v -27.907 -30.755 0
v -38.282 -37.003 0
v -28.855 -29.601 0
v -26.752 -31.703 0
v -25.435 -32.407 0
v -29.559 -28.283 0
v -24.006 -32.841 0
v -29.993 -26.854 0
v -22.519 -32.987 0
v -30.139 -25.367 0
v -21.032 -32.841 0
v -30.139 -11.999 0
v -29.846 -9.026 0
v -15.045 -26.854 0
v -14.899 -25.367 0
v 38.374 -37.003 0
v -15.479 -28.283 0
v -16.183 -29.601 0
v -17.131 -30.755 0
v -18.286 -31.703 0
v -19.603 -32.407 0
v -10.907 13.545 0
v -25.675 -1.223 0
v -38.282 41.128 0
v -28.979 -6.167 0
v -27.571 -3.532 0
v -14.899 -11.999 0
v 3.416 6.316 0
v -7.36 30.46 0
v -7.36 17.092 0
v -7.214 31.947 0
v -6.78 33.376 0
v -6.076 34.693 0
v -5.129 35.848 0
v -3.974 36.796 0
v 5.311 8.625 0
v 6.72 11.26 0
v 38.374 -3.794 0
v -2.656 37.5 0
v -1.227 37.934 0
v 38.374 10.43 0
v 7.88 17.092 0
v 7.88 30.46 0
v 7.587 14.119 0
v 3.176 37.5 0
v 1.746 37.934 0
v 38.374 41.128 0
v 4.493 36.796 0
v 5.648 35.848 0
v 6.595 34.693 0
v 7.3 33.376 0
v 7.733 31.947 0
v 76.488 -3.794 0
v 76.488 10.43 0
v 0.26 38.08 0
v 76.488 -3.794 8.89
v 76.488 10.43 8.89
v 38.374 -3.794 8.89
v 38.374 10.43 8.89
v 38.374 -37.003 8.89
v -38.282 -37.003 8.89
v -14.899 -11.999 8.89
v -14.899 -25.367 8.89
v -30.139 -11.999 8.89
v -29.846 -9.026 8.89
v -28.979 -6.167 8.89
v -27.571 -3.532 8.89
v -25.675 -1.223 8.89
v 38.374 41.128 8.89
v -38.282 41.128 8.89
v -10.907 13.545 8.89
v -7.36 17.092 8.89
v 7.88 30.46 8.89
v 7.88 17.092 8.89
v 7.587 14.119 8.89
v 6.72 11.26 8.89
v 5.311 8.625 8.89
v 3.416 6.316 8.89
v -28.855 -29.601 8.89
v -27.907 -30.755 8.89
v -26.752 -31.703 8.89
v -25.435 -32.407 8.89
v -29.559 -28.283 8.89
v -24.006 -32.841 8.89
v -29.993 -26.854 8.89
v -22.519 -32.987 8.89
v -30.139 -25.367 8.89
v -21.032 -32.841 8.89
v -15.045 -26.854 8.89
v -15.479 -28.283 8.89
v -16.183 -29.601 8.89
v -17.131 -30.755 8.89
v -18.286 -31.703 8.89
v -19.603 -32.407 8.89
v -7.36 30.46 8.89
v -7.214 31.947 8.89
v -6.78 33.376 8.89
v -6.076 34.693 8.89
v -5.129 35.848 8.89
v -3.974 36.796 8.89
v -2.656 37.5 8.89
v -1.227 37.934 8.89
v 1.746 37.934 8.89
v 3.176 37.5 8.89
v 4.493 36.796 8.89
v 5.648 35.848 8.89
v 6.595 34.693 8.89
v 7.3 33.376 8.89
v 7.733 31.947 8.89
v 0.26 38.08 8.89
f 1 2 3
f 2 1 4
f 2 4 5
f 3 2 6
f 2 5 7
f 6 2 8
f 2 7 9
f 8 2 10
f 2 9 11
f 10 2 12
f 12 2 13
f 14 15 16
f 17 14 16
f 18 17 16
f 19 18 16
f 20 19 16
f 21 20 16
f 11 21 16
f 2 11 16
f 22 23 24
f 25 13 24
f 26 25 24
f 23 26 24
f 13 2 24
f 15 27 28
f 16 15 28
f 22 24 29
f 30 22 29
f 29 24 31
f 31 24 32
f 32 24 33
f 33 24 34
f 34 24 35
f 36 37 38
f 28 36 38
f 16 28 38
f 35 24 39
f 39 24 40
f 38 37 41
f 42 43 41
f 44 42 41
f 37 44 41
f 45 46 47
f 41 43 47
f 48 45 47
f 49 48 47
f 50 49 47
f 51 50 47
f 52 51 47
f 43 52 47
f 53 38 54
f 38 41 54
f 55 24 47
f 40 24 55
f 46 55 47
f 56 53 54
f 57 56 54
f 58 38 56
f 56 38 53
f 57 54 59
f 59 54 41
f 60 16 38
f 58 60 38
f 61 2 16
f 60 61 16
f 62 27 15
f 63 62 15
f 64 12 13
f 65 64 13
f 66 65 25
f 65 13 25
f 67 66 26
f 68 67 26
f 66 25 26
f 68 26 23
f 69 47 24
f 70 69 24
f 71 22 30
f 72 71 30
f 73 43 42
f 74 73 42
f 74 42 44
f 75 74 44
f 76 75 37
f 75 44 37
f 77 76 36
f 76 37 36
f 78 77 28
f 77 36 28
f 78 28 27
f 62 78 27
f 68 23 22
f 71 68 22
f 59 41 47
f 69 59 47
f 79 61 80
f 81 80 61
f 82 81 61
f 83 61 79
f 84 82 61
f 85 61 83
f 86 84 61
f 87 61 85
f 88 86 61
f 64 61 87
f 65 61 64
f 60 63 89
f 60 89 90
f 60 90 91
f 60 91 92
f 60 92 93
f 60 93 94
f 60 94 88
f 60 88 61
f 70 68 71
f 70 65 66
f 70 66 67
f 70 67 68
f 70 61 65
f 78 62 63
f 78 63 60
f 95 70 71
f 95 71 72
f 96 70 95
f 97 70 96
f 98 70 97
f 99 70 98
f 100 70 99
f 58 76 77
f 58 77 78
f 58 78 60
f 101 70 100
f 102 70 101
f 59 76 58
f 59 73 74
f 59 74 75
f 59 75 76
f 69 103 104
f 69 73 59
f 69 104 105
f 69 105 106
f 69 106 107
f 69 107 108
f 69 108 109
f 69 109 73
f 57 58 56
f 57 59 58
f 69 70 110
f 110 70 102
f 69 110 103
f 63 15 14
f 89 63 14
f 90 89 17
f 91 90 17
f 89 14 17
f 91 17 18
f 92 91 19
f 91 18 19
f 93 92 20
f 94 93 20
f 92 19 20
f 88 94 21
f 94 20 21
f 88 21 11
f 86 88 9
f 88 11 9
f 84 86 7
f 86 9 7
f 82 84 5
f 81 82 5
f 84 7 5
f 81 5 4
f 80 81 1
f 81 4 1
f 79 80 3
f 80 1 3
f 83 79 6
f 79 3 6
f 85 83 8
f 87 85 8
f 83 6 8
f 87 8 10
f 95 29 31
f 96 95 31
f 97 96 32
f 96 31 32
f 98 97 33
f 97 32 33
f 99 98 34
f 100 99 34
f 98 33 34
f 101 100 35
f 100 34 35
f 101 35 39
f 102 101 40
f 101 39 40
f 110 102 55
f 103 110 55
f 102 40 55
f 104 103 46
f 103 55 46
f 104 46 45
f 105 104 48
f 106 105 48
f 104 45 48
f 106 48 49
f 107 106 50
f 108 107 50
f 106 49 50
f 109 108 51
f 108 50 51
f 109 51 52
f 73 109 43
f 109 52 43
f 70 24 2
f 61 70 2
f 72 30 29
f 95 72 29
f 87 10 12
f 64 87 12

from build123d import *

# Parameters (mm, degrees)
F1_DEPTH = 8.89


with BuildPart() as f1:
    # F0 (on Top) → F1 (new body)
    with BuildSketch(Plane.XY):
        Polygon((38.373657, 41.128395), (-10.907251, 41.128395), (-38.281802, 41.128395), (-38.281802, 4.189338), (-38.281802, -37.003323), (38.373657, -37.003323), (38.373657, -3.794326), (76.488459, -3.794326), (76.488459, 3.317674), (76.488459, 10.429674), (38.373657, 10.429674), align=None)
        with BuildLine():
            Line((-16.520221, 7.932111), (-10.907251, 13.545081))
            Line((-10.907251, 13.545081), (-7.36036, 17.091973))
            Line((-7.36036, 17.091973), (-7.36036, 30.459993))
            ThreePointArc((-7.36036, 30.459993), (0.25965, 38.079973), (7.87964, 30.459973))
            Line((7.87964, 30.459973), (7.87964, 17.091973))
            ThreePointArc((7.87964, 17.091973), (6.719564, 11.259877), (3.415948, 6.315665))
            Line((3.415948, 6.315665), (-5.739092, -2.839375))
            Line((-5.739092, -2.839375), (-14.898953, -11.999236))
            Line((-14.898953, -11.999236), (-14.898953, -25.367236))
            ThreePointArc((-14.898953, -25.367236), (-22.518953, -32.987236), (-30.138953, -25.367236))
            Line((-30.138953, -25.367236), (-30.138953, -11.999235))
            ThreePointArc((-30.138953, -11.999235), (-28.978877, -6.16714), (-25.67526, -1.222928))
            Line((-25.67526, -1.222928), (-16.520221, 7.932111))
        make_face(mode=Mode.SUBTRACT)
    extrude(amount=F1_DEPTH)


solid = f1.part
